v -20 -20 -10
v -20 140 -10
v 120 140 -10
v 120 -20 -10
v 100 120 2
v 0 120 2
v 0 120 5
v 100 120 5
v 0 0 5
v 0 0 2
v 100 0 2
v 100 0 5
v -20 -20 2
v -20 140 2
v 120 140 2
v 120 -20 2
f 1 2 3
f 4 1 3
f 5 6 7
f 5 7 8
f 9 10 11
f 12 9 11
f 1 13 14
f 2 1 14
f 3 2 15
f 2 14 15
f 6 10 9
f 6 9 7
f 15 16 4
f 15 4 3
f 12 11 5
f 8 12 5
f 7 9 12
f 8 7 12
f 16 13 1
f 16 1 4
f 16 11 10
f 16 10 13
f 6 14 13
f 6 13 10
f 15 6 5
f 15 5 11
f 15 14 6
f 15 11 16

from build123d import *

# Parameters (mm, degrees)
F0_W     = 140
F0_H     = 160
F0_W_2   = 100
F0_H_2   = 120
F1_DEPTH = 2
F2_DEPTH = 5
F3_DEPTH = 10


with BuildPart() as f1:
    # F0 (on Top) → F1 (new body)
    with BuildSketch(Plane.XY):
        with Locations((50, 60)):
            Rectangle(F0_W, F0_H)
        with Locations((50, 60)):
            Rectangle(F0_W_2, F0_H_2, mode=Mode.SUBTRACT)
        with Locations((50, 60)):
            Rectangle(F0_W_2, F0_H_2)
    extrude(amount=F1_DEPTH)

    # F0 (on Top) → F2 (join)
    with BuildSketch(Plane.XY):
        with Locations((50, 60)):
            Rectangle(F0_W_2, F0_H_2)
    extrude(amount=F2_DEPTH)

    # F0 (on Top) → F3 (join)
    with BuildSketch(Plane.XY):
        with Locations((50, 60)):
            Rectangle(F0_W, F0_H)
        with Locations((50, 60)):
            Rectangle(F0_W_2, F0_H_2, mode=Mode.SUBTRACT)
        with Locations((50, 60)):
            Rectangle(F0_W_2, F0_H_2)
    extrude(amount=-F3_DEPTH)


solid = f1.part
